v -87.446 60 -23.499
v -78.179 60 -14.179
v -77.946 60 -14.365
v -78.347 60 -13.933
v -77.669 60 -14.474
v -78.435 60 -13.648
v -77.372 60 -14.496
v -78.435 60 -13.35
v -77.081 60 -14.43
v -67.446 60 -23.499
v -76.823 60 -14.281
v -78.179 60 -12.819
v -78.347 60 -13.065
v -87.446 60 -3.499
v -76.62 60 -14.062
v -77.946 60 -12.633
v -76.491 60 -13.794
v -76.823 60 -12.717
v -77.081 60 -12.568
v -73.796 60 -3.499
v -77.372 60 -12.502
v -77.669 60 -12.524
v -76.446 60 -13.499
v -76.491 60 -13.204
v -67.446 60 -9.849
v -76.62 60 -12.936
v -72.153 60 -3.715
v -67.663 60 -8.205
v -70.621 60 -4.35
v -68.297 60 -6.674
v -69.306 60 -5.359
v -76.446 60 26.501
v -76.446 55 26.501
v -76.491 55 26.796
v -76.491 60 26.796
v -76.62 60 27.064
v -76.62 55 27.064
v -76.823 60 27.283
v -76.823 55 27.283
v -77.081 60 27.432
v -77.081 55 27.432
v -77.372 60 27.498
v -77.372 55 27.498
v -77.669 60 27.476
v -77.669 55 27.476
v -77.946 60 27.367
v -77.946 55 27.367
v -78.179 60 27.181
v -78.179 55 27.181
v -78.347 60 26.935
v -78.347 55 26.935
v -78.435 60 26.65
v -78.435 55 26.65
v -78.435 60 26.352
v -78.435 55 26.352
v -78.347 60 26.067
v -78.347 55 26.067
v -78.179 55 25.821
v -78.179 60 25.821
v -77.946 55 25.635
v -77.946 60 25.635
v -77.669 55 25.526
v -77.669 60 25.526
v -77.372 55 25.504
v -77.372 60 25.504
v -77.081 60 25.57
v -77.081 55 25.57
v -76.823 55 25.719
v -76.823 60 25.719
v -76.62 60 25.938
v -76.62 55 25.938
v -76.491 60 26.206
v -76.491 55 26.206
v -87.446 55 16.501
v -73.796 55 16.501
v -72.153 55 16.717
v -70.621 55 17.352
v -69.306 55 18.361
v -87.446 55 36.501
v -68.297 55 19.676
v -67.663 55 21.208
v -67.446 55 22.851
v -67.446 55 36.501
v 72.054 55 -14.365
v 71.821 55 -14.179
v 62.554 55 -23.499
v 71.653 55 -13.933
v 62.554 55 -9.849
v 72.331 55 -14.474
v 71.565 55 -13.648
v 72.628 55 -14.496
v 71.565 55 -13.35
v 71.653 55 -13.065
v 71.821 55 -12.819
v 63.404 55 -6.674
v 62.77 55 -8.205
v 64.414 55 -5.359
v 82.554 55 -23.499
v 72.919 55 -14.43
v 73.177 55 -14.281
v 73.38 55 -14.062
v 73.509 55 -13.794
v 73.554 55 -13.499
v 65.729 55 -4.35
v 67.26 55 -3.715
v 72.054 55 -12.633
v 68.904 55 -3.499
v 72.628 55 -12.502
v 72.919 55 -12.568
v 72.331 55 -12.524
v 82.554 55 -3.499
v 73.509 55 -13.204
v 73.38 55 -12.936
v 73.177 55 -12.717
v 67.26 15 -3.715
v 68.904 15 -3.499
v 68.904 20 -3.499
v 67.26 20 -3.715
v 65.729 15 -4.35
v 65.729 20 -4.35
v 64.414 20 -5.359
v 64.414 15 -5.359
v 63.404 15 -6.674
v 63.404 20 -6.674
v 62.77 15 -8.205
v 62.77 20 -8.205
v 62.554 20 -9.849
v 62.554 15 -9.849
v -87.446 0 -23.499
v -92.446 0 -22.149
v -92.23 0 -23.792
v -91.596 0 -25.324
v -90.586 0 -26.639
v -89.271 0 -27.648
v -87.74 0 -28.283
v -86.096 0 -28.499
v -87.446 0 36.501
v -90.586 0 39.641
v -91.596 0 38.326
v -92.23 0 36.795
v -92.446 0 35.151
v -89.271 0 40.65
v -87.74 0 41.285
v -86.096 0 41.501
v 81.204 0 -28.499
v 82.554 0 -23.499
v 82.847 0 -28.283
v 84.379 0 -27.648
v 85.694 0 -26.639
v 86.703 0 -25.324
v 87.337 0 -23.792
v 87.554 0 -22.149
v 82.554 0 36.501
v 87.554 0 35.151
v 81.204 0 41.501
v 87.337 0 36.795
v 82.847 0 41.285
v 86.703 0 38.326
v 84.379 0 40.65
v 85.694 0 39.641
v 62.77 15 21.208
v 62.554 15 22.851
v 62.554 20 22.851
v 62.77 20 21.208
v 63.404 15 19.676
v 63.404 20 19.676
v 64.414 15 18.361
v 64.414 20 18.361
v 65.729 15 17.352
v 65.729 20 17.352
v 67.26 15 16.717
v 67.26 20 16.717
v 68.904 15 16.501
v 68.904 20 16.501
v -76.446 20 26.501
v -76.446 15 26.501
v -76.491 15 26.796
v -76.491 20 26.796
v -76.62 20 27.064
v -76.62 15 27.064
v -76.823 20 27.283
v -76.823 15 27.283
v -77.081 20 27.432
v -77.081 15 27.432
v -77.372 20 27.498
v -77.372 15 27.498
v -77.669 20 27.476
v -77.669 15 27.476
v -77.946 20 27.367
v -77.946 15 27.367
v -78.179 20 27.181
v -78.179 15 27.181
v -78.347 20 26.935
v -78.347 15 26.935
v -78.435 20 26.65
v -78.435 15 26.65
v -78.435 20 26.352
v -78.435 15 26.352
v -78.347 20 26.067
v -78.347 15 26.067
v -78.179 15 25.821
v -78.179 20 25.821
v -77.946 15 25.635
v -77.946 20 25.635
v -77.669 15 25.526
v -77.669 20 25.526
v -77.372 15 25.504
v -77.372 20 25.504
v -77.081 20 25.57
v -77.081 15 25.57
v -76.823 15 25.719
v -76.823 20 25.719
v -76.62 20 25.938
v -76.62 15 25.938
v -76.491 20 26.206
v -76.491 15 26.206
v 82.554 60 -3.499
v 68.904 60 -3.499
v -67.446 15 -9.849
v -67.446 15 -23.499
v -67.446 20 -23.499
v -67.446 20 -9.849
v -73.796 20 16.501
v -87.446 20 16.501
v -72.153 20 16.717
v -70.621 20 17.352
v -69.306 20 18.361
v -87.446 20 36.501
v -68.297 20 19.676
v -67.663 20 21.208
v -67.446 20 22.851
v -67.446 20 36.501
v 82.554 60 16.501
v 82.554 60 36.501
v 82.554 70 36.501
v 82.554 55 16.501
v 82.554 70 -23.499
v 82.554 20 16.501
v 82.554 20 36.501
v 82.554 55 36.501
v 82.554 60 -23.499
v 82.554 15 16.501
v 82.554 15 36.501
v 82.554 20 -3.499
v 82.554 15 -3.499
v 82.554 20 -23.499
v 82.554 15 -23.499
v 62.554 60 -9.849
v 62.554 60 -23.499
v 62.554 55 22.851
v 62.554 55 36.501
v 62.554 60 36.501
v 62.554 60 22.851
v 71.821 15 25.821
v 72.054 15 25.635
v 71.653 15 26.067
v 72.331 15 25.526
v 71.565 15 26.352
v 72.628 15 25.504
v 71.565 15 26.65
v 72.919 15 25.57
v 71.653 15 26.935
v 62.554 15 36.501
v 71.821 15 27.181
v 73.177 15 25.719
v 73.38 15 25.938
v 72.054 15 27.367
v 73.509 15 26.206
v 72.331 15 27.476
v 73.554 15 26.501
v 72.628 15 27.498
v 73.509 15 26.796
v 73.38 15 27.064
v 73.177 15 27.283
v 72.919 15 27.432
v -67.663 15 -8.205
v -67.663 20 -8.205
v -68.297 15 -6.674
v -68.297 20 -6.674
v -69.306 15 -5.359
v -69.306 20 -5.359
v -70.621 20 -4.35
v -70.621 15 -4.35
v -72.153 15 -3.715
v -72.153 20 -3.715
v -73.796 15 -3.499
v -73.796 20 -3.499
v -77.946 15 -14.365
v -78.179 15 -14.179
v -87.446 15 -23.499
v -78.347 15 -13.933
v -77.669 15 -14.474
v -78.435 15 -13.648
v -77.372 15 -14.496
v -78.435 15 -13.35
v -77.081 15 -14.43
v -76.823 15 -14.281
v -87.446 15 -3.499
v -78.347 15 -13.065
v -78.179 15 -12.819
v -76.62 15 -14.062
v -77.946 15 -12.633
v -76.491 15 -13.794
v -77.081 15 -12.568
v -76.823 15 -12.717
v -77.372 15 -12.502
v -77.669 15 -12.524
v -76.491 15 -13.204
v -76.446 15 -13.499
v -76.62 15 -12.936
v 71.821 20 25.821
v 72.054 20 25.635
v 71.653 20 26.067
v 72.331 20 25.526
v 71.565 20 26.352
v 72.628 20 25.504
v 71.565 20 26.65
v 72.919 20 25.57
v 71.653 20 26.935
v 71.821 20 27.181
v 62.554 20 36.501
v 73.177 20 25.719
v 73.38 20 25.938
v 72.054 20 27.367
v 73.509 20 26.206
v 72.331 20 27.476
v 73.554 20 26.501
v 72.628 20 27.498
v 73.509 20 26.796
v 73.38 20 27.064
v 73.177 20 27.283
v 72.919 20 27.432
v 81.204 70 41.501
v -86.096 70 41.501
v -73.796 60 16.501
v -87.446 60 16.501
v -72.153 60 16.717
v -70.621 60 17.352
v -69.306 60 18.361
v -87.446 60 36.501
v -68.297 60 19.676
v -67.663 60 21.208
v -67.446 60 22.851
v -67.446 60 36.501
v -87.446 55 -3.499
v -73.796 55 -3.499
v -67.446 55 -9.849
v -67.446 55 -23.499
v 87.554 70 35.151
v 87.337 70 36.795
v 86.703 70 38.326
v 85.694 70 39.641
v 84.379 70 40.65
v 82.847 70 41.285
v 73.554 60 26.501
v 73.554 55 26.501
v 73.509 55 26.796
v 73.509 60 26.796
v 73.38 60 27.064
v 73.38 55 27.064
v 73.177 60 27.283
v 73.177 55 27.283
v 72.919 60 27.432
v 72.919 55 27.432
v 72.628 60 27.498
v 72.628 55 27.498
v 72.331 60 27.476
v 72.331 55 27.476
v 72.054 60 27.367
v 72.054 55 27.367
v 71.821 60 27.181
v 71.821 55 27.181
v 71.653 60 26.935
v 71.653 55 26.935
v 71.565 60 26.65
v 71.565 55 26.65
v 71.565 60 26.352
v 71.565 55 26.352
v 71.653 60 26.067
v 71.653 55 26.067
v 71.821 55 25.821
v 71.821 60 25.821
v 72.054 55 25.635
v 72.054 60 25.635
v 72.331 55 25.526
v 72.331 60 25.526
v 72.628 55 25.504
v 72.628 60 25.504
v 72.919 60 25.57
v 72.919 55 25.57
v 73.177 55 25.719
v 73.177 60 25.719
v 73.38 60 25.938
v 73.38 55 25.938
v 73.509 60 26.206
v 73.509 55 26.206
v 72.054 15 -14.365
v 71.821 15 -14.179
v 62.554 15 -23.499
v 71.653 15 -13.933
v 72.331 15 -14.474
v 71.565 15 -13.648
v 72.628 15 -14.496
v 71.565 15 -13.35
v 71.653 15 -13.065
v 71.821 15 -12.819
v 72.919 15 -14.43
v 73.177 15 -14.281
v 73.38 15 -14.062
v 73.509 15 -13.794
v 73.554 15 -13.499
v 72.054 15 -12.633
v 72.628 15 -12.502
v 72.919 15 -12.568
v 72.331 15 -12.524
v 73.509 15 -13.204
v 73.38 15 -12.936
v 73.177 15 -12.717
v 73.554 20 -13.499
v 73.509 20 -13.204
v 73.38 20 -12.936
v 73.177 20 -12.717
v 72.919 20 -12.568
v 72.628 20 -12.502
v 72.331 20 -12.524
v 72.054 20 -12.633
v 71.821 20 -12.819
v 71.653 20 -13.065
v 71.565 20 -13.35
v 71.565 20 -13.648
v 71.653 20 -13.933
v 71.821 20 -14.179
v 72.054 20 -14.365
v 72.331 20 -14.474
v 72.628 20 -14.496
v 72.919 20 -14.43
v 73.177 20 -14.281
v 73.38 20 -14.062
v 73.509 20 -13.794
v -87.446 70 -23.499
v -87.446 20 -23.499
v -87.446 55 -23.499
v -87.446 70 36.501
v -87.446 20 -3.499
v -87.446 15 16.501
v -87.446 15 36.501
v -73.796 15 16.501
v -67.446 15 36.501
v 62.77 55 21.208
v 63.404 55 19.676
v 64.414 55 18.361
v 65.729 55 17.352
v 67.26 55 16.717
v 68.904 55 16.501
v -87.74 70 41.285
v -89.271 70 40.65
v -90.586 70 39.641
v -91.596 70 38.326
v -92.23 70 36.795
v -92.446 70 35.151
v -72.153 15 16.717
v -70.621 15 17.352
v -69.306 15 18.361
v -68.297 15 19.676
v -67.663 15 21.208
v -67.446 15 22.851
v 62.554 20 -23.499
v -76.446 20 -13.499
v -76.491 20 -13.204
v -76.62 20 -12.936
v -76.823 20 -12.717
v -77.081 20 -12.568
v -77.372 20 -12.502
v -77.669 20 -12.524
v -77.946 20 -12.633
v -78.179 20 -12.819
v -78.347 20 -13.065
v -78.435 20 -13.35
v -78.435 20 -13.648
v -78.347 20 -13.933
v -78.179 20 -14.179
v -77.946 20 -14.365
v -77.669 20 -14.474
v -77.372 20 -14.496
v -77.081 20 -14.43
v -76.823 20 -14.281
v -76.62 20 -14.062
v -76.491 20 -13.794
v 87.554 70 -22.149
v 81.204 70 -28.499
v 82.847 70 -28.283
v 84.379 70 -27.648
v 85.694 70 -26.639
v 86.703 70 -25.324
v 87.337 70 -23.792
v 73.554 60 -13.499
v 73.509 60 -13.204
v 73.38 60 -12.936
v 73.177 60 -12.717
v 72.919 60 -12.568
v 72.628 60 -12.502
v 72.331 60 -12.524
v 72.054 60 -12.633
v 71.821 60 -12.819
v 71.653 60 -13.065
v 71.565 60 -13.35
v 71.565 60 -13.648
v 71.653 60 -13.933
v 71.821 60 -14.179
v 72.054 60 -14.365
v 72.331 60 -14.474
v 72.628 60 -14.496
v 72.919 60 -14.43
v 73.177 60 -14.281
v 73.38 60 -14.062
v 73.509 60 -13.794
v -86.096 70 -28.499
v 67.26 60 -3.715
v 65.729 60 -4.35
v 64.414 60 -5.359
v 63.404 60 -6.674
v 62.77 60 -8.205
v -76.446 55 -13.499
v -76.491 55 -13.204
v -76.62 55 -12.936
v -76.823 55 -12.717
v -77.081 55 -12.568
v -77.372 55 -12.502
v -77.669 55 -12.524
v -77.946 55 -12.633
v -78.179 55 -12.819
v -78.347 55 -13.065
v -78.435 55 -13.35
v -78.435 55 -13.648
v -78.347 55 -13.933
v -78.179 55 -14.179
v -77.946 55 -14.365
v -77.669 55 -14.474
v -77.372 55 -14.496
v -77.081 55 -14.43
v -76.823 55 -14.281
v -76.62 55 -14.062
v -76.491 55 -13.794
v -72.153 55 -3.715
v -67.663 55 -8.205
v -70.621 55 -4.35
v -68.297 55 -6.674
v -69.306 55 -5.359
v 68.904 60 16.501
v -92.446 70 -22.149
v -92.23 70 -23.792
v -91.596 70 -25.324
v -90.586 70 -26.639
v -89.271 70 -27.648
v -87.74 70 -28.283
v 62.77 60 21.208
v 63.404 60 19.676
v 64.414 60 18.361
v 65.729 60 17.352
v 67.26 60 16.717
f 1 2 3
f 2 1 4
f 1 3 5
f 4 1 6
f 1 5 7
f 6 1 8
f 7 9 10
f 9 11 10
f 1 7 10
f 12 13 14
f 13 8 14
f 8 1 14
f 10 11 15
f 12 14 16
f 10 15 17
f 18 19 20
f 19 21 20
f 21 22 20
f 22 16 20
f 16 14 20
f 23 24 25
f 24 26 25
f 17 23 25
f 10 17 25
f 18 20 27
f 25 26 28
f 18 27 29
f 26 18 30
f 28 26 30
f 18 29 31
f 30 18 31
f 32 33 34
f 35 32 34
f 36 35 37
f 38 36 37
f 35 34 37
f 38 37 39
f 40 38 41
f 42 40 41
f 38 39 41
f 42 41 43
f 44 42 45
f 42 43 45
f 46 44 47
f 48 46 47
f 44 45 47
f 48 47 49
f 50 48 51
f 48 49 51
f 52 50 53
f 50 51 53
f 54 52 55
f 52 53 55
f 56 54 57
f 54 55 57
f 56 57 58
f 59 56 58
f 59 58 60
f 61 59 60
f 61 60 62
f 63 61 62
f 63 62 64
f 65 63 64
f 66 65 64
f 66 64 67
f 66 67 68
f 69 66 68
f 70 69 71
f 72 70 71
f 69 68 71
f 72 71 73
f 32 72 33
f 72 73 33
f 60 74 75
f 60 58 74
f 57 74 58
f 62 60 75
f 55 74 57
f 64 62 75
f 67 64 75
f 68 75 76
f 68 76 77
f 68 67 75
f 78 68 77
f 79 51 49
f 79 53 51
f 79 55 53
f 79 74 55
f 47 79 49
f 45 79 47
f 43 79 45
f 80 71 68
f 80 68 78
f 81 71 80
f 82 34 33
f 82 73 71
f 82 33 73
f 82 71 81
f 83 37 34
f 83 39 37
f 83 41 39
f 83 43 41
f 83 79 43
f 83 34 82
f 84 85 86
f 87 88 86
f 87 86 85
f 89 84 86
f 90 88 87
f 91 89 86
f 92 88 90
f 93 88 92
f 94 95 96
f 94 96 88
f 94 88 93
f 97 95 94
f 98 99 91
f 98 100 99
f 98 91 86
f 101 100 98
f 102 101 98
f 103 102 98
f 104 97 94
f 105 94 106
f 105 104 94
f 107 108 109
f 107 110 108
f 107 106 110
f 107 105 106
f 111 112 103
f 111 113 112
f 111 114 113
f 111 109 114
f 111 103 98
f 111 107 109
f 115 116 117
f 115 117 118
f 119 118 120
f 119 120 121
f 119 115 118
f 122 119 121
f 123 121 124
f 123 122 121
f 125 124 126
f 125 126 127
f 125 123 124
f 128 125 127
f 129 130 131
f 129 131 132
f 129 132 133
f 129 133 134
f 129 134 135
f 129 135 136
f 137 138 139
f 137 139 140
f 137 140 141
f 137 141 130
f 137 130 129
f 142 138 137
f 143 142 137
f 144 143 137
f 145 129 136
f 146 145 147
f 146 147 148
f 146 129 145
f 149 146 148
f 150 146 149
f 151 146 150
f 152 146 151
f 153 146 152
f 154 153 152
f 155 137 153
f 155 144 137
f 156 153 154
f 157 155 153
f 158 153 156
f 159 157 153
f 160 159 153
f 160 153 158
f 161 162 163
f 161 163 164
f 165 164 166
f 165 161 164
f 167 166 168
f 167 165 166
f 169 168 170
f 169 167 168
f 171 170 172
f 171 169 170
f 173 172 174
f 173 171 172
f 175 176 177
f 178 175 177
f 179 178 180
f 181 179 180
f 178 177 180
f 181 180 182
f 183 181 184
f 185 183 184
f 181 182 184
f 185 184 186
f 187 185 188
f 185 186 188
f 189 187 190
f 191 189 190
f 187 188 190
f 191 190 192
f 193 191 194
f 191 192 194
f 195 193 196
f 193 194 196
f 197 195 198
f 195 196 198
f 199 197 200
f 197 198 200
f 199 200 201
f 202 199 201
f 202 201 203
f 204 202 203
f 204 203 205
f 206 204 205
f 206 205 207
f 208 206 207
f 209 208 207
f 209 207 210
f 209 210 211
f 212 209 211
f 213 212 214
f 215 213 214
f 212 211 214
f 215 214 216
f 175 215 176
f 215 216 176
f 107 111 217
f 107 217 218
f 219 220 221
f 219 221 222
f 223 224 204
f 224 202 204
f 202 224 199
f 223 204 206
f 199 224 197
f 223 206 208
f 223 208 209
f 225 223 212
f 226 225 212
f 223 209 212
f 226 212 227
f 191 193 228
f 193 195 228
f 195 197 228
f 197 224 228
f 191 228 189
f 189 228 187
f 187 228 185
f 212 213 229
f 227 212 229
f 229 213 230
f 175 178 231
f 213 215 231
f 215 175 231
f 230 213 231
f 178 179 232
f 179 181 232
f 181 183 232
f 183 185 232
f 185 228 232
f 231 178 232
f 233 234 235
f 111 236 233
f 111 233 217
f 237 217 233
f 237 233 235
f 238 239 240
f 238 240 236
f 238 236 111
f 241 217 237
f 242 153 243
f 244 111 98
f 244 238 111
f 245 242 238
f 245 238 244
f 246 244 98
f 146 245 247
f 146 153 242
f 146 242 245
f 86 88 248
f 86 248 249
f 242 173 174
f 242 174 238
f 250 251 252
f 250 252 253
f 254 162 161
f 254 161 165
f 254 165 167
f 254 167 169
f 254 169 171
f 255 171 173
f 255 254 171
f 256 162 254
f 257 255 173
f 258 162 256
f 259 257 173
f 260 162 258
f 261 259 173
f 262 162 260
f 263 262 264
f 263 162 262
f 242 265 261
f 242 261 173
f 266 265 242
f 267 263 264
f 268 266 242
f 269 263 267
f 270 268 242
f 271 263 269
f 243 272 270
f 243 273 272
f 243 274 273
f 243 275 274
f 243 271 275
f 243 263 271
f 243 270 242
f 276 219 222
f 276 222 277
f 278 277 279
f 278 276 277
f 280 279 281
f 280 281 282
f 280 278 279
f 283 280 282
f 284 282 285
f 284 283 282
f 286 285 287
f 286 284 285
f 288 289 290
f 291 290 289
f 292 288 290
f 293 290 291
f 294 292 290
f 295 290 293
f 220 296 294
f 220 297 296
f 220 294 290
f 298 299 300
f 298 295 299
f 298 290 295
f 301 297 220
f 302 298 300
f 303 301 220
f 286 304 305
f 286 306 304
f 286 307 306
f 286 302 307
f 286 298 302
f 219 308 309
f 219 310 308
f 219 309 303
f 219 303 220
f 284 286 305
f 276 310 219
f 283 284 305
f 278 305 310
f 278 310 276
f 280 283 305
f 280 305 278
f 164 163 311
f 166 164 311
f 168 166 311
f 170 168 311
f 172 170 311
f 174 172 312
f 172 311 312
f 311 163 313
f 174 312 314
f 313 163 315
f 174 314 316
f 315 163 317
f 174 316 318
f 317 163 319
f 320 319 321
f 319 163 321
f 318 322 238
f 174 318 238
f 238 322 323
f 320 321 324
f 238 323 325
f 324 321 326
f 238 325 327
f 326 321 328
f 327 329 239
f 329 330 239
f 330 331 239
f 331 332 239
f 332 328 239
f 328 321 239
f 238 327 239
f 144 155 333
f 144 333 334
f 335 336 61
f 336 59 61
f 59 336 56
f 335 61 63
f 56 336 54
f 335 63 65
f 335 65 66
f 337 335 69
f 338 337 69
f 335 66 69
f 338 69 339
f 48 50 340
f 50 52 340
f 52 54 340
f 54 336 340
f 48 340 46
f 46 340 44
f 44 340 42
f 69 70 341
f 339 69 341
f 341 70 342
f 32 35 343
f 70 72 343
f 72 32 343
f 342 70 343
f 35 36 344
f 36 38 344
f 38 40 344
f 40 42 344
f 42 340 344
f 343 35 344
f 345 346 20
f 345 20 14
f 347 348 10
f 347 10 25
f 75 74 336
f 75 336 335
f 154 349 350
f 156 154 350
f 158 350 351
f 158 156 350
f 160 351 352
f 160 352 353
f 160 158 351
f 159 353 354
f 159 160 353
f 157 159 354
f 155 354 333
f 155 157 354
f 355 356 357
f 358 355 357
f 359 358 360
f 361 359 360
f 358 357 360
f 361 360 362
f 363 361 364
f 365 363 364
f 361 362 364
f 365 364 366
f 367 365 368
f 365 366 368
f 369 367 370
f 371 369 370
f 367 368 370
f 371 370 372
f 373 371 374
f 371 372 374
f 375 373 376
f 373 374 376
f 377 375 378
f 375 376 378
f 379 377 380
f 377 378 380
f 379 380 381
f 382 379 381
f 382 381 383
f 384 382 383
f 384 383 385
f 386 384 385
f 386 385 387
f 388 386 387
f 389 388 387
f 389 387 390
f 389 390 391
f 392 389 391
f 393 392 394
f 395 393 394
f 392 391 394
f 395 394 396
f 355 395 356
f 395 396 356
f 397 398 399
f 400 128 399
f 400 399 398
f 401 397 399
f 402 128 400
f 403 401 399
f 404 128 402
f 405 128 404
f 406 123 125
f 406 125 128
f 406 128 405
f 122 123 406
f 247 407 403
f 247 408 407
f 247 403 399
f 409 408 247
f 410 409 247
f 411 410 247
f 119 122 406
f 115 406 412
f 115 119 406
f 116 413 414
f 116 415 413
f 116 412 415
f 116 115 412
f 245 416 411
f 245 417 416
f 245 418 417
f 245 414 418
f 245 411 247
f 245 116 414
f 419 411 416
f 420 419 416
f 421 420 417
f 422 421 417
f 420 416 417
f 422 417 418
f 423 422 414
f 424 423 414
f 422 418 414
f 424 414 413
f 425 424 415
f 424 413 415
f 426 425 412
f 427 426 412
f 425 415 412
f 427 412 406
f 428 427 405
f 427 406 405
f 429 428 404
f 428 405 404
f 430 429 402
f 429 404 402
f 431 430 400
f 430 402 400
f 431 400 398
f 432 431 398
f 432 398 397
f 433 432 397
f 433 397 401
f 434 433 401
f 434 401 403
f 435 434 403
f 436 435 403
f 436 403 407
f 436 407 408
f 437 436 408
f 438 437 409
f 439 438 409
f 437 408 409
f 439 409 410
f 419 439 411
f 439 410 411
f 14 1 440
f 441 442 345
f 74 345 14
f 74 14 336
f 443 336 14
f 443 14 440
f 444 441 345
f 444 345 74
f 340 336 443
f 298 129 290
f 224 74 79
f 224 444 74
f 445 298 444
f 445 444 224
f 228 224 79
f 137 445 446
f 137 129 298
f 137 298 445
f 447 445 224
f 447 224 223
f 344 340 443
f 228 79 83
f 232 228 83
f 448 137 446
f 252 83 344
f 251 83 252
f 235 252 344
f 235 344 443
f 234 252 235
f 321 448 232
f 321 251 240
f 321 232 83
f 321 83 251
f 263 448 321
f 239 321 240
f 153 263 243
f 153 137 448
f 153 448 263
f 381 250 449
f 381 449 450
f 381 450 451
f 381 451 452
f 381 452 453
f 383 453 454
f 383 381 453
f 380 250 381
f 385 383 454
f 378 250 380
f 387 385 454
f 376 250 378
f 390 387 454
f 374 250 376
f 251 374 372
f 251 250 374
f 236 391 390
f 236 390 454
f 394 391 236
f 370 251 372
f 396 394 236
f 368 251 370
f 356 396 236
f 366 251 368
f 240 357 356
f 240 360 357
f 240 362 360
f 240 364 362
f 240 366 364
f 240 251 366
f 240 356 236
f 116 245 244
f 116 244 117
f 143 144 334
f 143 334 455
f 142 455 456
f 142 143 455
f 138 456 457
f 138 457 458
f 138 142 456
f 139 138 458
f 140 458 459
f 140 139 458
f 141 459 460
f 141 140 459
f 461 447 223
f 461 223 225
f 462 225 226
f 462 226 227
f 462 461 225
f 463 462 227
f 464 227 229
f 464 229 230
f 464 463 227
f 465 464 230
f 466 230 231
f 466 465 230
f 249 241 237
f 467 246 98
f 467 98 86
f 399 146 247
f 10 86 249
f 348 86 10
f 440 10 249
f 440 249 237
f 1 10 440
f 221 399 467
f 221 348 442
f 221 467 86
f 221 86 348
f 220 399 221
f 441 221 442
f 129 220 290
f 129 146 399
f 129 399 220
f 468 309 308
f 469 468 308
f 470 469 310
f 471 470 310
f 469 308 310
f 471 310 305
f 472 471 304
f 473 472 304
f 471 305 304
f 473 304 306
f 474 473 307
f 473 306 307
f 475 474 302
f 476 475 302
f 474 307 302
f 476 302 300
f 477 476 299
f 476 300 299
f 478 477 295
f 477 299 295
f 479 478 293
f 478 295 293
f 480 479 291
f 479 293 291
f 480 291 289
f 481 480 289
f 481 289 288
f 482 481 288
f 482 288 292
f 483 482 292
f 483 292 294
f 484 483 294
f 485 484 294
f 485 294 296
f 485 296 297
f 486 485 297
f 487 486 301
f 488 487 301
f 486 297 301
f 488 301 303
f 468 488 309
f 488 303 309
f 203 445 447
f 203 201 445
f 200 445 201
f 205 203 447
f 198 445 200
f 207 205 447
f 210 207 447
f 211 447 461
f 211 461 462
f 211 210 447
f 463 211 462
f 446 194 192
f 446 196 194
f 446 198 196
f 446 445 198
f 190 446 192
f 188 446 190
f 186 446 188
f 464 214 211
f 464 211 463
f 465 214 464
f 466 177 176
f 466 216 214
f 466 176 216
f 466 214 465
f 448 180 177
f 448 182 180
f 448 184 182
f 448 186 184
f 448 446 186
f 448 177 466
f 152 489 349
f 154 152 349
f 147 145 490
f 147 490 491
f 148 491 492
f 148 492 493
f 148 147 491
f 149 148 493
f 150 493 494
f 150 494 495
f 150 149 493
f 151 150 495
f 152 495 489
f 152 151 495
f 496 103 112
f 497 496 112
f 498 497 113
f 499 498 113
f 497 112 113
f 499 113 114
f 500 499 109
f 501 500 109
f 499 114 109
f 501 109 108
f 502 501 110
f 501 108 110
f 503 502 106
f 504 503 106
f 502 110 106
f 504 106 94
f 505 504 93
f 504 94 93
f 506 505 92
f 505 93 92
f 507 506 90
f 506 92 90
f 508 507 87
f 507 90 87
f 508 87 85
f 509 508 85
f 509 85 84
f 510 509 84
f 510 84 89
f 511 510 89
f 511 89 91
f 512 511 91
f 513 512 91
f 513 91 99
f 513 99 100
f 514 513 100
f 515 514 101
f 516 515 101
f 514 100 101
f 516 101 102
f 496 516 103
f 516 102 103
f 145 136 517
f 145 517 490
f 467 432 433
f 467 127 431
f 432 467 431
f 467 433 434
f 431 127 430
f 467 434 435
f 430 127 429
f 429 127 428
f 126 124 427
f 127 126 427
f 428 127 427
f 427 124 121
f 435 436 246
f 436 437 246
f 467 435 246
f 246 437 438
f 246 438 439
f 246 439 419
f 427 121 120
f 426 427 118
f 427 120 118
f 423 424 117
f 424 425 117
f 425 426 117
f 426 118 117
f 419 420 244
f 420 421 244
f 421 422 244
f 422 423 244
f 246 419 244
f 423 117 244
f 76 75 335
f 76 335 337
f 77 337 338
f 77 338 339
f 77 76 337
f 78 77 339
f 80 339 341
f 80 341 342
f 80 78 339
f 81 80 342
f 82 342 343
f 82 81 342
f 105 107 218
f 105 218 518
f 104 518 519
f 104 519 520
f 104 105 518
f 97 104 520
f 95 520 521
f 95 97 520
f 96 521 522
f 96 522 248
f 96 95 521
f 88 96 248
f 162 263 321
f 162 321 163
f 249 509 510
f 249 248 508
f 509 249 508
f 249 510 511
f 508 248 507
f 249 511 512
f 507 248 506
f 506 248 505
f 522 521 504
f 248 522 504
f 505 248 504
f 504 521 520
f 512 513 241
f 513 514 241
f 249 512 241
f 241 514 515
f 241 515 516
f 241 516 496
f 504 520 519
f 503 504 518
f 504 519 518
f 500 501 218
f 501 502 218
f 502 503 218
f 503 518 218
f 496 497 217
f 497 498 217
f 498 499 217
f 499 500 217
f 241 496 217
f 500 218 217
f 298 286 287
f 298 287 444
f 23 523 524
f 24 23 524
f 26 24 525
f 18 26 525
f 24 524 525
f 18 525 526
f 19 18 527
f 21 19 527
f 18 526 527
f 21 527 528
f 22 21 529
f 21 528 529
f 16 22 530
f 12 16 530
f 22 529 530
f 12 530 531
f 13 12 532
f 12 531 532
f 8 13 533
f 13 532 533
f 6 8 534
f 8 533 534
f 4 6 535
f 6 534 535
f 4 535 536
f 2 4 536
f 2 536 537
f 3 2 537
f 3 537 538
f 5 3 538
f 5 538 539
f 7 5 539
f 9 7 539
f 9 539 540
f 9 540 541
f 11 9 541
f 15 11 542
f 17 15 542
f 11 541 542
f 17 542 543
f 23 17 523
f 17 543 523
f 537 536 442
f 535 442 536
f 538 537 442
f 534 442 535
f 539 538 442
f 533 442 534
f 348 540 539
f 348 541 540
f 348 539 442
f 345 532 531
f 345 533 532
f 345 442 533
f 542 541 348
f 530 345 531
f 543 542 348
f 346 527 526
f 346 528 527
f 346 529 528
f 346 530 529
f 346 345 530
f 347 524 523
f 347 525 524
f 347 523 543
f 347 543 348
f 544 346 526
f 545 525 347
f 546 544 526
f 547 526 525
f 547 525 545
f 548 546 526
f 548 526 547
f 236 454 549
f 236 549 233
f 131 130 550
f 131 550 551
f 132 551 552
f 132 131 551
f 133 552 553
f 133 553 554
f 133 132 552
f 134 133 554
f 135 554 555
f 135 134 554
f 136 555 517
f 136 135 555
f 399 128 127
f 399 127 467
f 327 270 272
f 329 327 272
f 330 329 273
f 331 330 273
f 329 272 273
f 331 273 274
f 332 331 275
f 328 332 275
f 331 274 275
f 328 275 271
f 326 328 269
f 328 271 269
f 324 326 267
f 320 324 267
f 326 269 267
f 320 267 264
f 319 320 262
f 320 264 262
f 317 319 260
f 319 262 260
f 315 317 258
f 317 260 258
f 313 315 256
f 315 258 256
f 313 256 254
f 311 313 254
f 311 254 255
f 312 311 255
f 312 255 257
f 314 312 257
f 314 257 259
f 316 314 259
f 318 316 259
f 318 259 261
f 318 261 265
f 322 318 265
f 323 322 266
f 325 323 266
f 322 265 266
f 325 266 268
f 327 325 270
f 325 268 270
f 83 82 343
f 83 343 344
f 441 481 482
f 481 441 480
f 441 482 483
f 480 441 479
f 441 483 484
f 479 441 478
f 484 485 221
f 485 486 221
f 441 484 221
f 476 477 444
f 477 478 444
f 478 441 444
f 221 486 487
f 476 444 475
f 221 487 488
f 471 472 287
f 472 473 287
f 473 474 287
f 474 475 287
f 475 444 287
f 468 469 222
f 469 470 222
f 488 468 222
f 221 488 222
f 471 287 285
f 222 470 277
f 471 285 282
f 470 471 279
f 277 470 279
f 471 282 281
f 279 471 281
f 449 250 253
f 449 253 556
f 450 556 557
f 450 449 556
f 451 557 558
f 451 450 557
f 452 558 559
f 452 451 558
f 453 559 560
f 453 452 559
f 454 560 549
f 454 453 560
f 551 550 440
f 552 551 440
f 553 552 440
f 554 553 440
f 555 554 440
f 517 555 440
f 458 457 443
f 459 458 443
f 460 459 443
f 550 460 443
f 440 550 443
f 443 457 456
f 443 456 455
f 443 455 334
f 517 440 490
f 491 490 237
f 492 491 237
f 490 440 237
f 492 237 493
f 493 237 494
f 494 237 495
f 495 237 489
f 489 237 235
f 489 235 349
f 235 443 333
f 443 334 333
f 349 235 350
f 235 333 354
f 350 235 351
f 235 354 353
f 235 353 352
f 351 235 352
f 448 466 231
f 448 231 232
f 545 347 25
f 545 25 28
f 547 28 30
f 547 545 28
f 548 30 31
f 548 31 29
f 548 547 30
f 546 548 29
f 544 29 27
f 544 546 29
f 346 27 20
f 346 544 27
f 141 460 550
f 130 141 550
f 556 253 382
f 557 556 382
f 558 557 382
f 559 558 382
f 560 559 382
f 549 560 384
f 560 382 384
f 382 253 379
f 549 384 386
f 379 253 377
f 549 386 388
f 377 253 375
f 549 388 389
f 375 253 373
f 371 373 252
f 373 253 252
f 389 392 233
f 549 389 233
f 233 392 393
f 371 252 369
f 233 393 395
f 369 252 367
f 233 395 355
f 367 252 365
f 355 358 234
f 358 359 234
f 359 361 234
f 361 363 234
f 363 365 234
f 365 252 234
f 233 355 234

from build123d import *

# Parameters (mm, degrees)
F1_DEPTH = 70
F2_START = -15
F0_R     = 1
F2_DEPTH = 5
F3_START = -55
F3_DEPTH = 5


with BuildPart() as f1:
    # F0 (on Front) → F1 (new body)
    with BuildSketch(Plane.XZ):
        with BuildLine():
            Line((81.2036521524, 41.5010131064), (-86.0963478476, 41.5010131064))
            ThreePointArc((-86.0963478476, 41.5010131064), (-90.5864759081, 39.6411411669), (-92.4463478476, 35.1510131064))
            Line((-92.4463478476, 35.1510131064), (-92.4463478476, -22.1489868936))
            ThreePointArc((-92.4463478476, -22.1489868936), (-90.5864759081, -26.6391149541), (-86.0963478476, -28.4989868936))
            Line((-86.0963478476, -28.4989868936), (81.2036521524, -28.4989868936))
            ThreePointArc((81.2036521524, -28.4989868936), (85.693780213, -26.6391149541), (87.5536521524, -22.1489868936))
            Line((87.5536521524, -22.1489868936), (87.5536521524, 35.1510131064))
            ThreePointArc((87.5536521524, 35.1510131064), (85.693780213, 39.6411411669), (81.2036521524, 41.5010131064))
        make_face()
        Polygon((-87.4463478476, 16.5010131064), (-87.4463478476, 36.5010131064), (-67.4463478476, 36.5010131064), (-62.4463478476, 36.5010131064), (-7.4463478476, 36.5010131064), (62.5536521524, 36.5010131064), (82.5536521524, 36.5010131064), (82.5536521524, 16.5010131064), (82.5536521524, -3.4989868936), (82.5536521524, -23.4989868936), (62.5536521524, -23.4989868936), (-7.4463478476, -23.4989868936), (-12.4463478476, -23.4989868936), (-62.4463478476, -23.4989868936), (-67.4463478476, -23.4989868936), (-87.4463478476, -23.4989868936), (-87.4463478476, -3.4989868936), align=None, mode=Mode.SUBTRACT)
    extrude(amount=-F1_DEPTH)

    # F0 (on Front) → F2 (join)
    with BuildSketch(Plane.XZ.offset(F2_START)):
        with BuildLine():
            Line((-73.7963478476, -3.4989868936), (-87.4463478476, -3.4989868936))
            Line((-87.4463478476, -3.4989868936), (-87.4463478476, -23.4989868936))
            Line((-87.4463478476, -23.4989868936), (-67.4463478476, -23.4989868936))
            Line((-67.4463478476, -23.4989868936), (-67.4463478476, -18.4989868936))
            Line((-67.4463478476, -18.4989868936), (-67.4463478476, -9.8489868936))
            ThreePointArc((-67.4463478476, -9.8489868936), (-69.306219787, -5.3588588331), (-73.7963478476, -3.4989868936))
        make_face()
        with Locations((-77.4463478476, -13.4989868936)):
            Circle(F0_R, mode=Mode.SUBTRACT)
        with BuildLine():
            Line((62.5536521524, -9.8489868936), (62.5536521524, -23.4989868936))
            Line((62.5536521524, -23.4989868936), (82.5536521524, -23.4989868936))
            Line((82.5536521524, -23.4989868936), (82.5536521524, -3.4989868936))
            Line((82.5536521524, -3.4989868936), (68.9036521524, -3.4989868936))
            ThreePointArc((68.9036521524, -3.4989868936), (64.4135240919, -5.3588588331), (62.5536521524, -9.8489868936))
        make_face()
        with Locations((72.5536521524, -13.4989868936)):
            Circle(F0_R, mode=Mode.SUBTRACT)
        with BuildLine():
            Line((82.5536521524, 36.5010131064), (62.5536521524, 36.5010131064))
            Line((62.5536521524, 36.5010131064), (62.5536521524, 22.8510131064))
            ThreePointArc((62.5536521524, 22.8510131064), (64.4135240919, 18.3608850459), (68.9036521524, 16.5010131064))
            Line((68.9036521524, 16.5010131064), (82.5536521524, 16.5010131064))
            Line((82.5536521524, 16.5010131064), (82.5536521524, 36.5010131064))
        make_face()
        with Locations((72.5536521524, 26.5010131064)):
            Circle(F0_R, mode=Mode.SUBTRACT)
        with BuildLine():
            Line((-67.4463478476, 36.5010131064), (-87.4463478476, 36.5010131064))
            Line((-87.4463478476, 36.5010131064), (-87.4463478476, 16.5010131064))
            Line((-87.4463478476, 16.5010131064), (-73.7963478476, 16.5010131064))
            ThreePointArc((-73.7963478476, 16.5010131064), (-69.306219787, 18.3608850459), (-67.4463478476, 22.8510131064))
            Line((-67.4463478476, 22.8510131064), (-67.4463478476, 36.5010131064))
        make_face()
        with Locations((-77.4463478476, 26.5010131064)):
            Circle(F0_R, mode=Mode.SUBTRACT)
    extrude(amount=-F2_DEPTH)

    # F0 (on Front) → F3 (join)
    with BuildSketch(Plane.XZ.offset(F3_START)):
        with BuildLine():
            Line((82.5536521524, 36.5010131064), (62.5536521524, 36.5010131064))
            Line((62.5536521524, 36.5010131064), (62.5536521524, 22.8510131064))
            ThreePointArc((62.5536521524, 22.8510131064), (64.4135240919, 18.3608850459), (68.9036521524, 16.5010131064))
            Line((68.9036521524, 16.5010131064), (82.5536521524, 16.5010131064))
            Line((82.5536521524, 16.5010131064), (82.5536521524, 36.5010131064))
        make_face()
        with Locations((72.5536521524, 26.5010131064)):
            Circle(F0_R, mode=Mode.SUBTRACT)
        with BuildLine():
            Line((62.5536521524, -9.8489868936), (62.5536521524, -23.4989868936))
            Line((62.5536521524, -23.4989868936), (82.5536521524, -23.4989868936))
            Line((82.5536521524, -23.4989868936), (82.5536521524, -3.4989868936))
            Line((82.5536521524, -3.4989868936), (68.9036521524, -3.4989868936))
            ThreePointArc((68.9036521524, -3.4989868936), (64.4135240919, -5.3588588331), (62.5536521524, -9.8489868936))
        make_face()
        with Locations((72.5536521524, -13.4989868936)):
            Circle(F0_R, mode=Mode.SUBTRACT)
        with BuildLine():
            Line((-73.7963478476, -3.4989868936), (-87.4463478476, -3.4989868936))
            Line((-87.4463478476, -3.4989868936), (-87.4463478476, -23.4989868936))
            Line((-87.4463478476, -23.4989868936), (-67.4463478476, -23.4989868936))
            Line((-67.4463478476, -23.4989868936), (-67.4463478476, -18.4989868936))
            Line((-67.4463478476, -18.4989868936), (-67.4463478476, -9.8489868936))
            ThreePointArc((-67.4463478476, -9.8489868936), (-69.306219787, -5.3588588331), (-73.7963478476, -3.4989868936))
        make_face()
        with Locations((-77.4463478476, -13.4989868936)):
            Circle(F0_R, mode=Mode.SUBTRACT)
        with BuildLine():
            Line((-67.4463478476, 36.5010131064), (-87.4463478476, 36.5010131064))
            Line((-87.4463478476, 36.5010131064), (-87.4463478476, 16.5010131064))
            Line((-87.4463478476, 16.5010131064), (-73.7963478476, 16.5010131064))
            ThreePointArc((-73.7963478476, 16.5010131064), (-69.306219787, 18.3608850459), (-67.4463478476, 22.8510131064))
            Line((-67.4463478476, 22.8510131064), (-67.4463478476, 36.5010131064))
        make_face()
        with Locations((-77.4463478476, 26.5010131064)):
            Circle(F0_R, mode=Mode.SUBTRACT)
    extrude(amount=-F3_DEPTH)


solid = f1.part
